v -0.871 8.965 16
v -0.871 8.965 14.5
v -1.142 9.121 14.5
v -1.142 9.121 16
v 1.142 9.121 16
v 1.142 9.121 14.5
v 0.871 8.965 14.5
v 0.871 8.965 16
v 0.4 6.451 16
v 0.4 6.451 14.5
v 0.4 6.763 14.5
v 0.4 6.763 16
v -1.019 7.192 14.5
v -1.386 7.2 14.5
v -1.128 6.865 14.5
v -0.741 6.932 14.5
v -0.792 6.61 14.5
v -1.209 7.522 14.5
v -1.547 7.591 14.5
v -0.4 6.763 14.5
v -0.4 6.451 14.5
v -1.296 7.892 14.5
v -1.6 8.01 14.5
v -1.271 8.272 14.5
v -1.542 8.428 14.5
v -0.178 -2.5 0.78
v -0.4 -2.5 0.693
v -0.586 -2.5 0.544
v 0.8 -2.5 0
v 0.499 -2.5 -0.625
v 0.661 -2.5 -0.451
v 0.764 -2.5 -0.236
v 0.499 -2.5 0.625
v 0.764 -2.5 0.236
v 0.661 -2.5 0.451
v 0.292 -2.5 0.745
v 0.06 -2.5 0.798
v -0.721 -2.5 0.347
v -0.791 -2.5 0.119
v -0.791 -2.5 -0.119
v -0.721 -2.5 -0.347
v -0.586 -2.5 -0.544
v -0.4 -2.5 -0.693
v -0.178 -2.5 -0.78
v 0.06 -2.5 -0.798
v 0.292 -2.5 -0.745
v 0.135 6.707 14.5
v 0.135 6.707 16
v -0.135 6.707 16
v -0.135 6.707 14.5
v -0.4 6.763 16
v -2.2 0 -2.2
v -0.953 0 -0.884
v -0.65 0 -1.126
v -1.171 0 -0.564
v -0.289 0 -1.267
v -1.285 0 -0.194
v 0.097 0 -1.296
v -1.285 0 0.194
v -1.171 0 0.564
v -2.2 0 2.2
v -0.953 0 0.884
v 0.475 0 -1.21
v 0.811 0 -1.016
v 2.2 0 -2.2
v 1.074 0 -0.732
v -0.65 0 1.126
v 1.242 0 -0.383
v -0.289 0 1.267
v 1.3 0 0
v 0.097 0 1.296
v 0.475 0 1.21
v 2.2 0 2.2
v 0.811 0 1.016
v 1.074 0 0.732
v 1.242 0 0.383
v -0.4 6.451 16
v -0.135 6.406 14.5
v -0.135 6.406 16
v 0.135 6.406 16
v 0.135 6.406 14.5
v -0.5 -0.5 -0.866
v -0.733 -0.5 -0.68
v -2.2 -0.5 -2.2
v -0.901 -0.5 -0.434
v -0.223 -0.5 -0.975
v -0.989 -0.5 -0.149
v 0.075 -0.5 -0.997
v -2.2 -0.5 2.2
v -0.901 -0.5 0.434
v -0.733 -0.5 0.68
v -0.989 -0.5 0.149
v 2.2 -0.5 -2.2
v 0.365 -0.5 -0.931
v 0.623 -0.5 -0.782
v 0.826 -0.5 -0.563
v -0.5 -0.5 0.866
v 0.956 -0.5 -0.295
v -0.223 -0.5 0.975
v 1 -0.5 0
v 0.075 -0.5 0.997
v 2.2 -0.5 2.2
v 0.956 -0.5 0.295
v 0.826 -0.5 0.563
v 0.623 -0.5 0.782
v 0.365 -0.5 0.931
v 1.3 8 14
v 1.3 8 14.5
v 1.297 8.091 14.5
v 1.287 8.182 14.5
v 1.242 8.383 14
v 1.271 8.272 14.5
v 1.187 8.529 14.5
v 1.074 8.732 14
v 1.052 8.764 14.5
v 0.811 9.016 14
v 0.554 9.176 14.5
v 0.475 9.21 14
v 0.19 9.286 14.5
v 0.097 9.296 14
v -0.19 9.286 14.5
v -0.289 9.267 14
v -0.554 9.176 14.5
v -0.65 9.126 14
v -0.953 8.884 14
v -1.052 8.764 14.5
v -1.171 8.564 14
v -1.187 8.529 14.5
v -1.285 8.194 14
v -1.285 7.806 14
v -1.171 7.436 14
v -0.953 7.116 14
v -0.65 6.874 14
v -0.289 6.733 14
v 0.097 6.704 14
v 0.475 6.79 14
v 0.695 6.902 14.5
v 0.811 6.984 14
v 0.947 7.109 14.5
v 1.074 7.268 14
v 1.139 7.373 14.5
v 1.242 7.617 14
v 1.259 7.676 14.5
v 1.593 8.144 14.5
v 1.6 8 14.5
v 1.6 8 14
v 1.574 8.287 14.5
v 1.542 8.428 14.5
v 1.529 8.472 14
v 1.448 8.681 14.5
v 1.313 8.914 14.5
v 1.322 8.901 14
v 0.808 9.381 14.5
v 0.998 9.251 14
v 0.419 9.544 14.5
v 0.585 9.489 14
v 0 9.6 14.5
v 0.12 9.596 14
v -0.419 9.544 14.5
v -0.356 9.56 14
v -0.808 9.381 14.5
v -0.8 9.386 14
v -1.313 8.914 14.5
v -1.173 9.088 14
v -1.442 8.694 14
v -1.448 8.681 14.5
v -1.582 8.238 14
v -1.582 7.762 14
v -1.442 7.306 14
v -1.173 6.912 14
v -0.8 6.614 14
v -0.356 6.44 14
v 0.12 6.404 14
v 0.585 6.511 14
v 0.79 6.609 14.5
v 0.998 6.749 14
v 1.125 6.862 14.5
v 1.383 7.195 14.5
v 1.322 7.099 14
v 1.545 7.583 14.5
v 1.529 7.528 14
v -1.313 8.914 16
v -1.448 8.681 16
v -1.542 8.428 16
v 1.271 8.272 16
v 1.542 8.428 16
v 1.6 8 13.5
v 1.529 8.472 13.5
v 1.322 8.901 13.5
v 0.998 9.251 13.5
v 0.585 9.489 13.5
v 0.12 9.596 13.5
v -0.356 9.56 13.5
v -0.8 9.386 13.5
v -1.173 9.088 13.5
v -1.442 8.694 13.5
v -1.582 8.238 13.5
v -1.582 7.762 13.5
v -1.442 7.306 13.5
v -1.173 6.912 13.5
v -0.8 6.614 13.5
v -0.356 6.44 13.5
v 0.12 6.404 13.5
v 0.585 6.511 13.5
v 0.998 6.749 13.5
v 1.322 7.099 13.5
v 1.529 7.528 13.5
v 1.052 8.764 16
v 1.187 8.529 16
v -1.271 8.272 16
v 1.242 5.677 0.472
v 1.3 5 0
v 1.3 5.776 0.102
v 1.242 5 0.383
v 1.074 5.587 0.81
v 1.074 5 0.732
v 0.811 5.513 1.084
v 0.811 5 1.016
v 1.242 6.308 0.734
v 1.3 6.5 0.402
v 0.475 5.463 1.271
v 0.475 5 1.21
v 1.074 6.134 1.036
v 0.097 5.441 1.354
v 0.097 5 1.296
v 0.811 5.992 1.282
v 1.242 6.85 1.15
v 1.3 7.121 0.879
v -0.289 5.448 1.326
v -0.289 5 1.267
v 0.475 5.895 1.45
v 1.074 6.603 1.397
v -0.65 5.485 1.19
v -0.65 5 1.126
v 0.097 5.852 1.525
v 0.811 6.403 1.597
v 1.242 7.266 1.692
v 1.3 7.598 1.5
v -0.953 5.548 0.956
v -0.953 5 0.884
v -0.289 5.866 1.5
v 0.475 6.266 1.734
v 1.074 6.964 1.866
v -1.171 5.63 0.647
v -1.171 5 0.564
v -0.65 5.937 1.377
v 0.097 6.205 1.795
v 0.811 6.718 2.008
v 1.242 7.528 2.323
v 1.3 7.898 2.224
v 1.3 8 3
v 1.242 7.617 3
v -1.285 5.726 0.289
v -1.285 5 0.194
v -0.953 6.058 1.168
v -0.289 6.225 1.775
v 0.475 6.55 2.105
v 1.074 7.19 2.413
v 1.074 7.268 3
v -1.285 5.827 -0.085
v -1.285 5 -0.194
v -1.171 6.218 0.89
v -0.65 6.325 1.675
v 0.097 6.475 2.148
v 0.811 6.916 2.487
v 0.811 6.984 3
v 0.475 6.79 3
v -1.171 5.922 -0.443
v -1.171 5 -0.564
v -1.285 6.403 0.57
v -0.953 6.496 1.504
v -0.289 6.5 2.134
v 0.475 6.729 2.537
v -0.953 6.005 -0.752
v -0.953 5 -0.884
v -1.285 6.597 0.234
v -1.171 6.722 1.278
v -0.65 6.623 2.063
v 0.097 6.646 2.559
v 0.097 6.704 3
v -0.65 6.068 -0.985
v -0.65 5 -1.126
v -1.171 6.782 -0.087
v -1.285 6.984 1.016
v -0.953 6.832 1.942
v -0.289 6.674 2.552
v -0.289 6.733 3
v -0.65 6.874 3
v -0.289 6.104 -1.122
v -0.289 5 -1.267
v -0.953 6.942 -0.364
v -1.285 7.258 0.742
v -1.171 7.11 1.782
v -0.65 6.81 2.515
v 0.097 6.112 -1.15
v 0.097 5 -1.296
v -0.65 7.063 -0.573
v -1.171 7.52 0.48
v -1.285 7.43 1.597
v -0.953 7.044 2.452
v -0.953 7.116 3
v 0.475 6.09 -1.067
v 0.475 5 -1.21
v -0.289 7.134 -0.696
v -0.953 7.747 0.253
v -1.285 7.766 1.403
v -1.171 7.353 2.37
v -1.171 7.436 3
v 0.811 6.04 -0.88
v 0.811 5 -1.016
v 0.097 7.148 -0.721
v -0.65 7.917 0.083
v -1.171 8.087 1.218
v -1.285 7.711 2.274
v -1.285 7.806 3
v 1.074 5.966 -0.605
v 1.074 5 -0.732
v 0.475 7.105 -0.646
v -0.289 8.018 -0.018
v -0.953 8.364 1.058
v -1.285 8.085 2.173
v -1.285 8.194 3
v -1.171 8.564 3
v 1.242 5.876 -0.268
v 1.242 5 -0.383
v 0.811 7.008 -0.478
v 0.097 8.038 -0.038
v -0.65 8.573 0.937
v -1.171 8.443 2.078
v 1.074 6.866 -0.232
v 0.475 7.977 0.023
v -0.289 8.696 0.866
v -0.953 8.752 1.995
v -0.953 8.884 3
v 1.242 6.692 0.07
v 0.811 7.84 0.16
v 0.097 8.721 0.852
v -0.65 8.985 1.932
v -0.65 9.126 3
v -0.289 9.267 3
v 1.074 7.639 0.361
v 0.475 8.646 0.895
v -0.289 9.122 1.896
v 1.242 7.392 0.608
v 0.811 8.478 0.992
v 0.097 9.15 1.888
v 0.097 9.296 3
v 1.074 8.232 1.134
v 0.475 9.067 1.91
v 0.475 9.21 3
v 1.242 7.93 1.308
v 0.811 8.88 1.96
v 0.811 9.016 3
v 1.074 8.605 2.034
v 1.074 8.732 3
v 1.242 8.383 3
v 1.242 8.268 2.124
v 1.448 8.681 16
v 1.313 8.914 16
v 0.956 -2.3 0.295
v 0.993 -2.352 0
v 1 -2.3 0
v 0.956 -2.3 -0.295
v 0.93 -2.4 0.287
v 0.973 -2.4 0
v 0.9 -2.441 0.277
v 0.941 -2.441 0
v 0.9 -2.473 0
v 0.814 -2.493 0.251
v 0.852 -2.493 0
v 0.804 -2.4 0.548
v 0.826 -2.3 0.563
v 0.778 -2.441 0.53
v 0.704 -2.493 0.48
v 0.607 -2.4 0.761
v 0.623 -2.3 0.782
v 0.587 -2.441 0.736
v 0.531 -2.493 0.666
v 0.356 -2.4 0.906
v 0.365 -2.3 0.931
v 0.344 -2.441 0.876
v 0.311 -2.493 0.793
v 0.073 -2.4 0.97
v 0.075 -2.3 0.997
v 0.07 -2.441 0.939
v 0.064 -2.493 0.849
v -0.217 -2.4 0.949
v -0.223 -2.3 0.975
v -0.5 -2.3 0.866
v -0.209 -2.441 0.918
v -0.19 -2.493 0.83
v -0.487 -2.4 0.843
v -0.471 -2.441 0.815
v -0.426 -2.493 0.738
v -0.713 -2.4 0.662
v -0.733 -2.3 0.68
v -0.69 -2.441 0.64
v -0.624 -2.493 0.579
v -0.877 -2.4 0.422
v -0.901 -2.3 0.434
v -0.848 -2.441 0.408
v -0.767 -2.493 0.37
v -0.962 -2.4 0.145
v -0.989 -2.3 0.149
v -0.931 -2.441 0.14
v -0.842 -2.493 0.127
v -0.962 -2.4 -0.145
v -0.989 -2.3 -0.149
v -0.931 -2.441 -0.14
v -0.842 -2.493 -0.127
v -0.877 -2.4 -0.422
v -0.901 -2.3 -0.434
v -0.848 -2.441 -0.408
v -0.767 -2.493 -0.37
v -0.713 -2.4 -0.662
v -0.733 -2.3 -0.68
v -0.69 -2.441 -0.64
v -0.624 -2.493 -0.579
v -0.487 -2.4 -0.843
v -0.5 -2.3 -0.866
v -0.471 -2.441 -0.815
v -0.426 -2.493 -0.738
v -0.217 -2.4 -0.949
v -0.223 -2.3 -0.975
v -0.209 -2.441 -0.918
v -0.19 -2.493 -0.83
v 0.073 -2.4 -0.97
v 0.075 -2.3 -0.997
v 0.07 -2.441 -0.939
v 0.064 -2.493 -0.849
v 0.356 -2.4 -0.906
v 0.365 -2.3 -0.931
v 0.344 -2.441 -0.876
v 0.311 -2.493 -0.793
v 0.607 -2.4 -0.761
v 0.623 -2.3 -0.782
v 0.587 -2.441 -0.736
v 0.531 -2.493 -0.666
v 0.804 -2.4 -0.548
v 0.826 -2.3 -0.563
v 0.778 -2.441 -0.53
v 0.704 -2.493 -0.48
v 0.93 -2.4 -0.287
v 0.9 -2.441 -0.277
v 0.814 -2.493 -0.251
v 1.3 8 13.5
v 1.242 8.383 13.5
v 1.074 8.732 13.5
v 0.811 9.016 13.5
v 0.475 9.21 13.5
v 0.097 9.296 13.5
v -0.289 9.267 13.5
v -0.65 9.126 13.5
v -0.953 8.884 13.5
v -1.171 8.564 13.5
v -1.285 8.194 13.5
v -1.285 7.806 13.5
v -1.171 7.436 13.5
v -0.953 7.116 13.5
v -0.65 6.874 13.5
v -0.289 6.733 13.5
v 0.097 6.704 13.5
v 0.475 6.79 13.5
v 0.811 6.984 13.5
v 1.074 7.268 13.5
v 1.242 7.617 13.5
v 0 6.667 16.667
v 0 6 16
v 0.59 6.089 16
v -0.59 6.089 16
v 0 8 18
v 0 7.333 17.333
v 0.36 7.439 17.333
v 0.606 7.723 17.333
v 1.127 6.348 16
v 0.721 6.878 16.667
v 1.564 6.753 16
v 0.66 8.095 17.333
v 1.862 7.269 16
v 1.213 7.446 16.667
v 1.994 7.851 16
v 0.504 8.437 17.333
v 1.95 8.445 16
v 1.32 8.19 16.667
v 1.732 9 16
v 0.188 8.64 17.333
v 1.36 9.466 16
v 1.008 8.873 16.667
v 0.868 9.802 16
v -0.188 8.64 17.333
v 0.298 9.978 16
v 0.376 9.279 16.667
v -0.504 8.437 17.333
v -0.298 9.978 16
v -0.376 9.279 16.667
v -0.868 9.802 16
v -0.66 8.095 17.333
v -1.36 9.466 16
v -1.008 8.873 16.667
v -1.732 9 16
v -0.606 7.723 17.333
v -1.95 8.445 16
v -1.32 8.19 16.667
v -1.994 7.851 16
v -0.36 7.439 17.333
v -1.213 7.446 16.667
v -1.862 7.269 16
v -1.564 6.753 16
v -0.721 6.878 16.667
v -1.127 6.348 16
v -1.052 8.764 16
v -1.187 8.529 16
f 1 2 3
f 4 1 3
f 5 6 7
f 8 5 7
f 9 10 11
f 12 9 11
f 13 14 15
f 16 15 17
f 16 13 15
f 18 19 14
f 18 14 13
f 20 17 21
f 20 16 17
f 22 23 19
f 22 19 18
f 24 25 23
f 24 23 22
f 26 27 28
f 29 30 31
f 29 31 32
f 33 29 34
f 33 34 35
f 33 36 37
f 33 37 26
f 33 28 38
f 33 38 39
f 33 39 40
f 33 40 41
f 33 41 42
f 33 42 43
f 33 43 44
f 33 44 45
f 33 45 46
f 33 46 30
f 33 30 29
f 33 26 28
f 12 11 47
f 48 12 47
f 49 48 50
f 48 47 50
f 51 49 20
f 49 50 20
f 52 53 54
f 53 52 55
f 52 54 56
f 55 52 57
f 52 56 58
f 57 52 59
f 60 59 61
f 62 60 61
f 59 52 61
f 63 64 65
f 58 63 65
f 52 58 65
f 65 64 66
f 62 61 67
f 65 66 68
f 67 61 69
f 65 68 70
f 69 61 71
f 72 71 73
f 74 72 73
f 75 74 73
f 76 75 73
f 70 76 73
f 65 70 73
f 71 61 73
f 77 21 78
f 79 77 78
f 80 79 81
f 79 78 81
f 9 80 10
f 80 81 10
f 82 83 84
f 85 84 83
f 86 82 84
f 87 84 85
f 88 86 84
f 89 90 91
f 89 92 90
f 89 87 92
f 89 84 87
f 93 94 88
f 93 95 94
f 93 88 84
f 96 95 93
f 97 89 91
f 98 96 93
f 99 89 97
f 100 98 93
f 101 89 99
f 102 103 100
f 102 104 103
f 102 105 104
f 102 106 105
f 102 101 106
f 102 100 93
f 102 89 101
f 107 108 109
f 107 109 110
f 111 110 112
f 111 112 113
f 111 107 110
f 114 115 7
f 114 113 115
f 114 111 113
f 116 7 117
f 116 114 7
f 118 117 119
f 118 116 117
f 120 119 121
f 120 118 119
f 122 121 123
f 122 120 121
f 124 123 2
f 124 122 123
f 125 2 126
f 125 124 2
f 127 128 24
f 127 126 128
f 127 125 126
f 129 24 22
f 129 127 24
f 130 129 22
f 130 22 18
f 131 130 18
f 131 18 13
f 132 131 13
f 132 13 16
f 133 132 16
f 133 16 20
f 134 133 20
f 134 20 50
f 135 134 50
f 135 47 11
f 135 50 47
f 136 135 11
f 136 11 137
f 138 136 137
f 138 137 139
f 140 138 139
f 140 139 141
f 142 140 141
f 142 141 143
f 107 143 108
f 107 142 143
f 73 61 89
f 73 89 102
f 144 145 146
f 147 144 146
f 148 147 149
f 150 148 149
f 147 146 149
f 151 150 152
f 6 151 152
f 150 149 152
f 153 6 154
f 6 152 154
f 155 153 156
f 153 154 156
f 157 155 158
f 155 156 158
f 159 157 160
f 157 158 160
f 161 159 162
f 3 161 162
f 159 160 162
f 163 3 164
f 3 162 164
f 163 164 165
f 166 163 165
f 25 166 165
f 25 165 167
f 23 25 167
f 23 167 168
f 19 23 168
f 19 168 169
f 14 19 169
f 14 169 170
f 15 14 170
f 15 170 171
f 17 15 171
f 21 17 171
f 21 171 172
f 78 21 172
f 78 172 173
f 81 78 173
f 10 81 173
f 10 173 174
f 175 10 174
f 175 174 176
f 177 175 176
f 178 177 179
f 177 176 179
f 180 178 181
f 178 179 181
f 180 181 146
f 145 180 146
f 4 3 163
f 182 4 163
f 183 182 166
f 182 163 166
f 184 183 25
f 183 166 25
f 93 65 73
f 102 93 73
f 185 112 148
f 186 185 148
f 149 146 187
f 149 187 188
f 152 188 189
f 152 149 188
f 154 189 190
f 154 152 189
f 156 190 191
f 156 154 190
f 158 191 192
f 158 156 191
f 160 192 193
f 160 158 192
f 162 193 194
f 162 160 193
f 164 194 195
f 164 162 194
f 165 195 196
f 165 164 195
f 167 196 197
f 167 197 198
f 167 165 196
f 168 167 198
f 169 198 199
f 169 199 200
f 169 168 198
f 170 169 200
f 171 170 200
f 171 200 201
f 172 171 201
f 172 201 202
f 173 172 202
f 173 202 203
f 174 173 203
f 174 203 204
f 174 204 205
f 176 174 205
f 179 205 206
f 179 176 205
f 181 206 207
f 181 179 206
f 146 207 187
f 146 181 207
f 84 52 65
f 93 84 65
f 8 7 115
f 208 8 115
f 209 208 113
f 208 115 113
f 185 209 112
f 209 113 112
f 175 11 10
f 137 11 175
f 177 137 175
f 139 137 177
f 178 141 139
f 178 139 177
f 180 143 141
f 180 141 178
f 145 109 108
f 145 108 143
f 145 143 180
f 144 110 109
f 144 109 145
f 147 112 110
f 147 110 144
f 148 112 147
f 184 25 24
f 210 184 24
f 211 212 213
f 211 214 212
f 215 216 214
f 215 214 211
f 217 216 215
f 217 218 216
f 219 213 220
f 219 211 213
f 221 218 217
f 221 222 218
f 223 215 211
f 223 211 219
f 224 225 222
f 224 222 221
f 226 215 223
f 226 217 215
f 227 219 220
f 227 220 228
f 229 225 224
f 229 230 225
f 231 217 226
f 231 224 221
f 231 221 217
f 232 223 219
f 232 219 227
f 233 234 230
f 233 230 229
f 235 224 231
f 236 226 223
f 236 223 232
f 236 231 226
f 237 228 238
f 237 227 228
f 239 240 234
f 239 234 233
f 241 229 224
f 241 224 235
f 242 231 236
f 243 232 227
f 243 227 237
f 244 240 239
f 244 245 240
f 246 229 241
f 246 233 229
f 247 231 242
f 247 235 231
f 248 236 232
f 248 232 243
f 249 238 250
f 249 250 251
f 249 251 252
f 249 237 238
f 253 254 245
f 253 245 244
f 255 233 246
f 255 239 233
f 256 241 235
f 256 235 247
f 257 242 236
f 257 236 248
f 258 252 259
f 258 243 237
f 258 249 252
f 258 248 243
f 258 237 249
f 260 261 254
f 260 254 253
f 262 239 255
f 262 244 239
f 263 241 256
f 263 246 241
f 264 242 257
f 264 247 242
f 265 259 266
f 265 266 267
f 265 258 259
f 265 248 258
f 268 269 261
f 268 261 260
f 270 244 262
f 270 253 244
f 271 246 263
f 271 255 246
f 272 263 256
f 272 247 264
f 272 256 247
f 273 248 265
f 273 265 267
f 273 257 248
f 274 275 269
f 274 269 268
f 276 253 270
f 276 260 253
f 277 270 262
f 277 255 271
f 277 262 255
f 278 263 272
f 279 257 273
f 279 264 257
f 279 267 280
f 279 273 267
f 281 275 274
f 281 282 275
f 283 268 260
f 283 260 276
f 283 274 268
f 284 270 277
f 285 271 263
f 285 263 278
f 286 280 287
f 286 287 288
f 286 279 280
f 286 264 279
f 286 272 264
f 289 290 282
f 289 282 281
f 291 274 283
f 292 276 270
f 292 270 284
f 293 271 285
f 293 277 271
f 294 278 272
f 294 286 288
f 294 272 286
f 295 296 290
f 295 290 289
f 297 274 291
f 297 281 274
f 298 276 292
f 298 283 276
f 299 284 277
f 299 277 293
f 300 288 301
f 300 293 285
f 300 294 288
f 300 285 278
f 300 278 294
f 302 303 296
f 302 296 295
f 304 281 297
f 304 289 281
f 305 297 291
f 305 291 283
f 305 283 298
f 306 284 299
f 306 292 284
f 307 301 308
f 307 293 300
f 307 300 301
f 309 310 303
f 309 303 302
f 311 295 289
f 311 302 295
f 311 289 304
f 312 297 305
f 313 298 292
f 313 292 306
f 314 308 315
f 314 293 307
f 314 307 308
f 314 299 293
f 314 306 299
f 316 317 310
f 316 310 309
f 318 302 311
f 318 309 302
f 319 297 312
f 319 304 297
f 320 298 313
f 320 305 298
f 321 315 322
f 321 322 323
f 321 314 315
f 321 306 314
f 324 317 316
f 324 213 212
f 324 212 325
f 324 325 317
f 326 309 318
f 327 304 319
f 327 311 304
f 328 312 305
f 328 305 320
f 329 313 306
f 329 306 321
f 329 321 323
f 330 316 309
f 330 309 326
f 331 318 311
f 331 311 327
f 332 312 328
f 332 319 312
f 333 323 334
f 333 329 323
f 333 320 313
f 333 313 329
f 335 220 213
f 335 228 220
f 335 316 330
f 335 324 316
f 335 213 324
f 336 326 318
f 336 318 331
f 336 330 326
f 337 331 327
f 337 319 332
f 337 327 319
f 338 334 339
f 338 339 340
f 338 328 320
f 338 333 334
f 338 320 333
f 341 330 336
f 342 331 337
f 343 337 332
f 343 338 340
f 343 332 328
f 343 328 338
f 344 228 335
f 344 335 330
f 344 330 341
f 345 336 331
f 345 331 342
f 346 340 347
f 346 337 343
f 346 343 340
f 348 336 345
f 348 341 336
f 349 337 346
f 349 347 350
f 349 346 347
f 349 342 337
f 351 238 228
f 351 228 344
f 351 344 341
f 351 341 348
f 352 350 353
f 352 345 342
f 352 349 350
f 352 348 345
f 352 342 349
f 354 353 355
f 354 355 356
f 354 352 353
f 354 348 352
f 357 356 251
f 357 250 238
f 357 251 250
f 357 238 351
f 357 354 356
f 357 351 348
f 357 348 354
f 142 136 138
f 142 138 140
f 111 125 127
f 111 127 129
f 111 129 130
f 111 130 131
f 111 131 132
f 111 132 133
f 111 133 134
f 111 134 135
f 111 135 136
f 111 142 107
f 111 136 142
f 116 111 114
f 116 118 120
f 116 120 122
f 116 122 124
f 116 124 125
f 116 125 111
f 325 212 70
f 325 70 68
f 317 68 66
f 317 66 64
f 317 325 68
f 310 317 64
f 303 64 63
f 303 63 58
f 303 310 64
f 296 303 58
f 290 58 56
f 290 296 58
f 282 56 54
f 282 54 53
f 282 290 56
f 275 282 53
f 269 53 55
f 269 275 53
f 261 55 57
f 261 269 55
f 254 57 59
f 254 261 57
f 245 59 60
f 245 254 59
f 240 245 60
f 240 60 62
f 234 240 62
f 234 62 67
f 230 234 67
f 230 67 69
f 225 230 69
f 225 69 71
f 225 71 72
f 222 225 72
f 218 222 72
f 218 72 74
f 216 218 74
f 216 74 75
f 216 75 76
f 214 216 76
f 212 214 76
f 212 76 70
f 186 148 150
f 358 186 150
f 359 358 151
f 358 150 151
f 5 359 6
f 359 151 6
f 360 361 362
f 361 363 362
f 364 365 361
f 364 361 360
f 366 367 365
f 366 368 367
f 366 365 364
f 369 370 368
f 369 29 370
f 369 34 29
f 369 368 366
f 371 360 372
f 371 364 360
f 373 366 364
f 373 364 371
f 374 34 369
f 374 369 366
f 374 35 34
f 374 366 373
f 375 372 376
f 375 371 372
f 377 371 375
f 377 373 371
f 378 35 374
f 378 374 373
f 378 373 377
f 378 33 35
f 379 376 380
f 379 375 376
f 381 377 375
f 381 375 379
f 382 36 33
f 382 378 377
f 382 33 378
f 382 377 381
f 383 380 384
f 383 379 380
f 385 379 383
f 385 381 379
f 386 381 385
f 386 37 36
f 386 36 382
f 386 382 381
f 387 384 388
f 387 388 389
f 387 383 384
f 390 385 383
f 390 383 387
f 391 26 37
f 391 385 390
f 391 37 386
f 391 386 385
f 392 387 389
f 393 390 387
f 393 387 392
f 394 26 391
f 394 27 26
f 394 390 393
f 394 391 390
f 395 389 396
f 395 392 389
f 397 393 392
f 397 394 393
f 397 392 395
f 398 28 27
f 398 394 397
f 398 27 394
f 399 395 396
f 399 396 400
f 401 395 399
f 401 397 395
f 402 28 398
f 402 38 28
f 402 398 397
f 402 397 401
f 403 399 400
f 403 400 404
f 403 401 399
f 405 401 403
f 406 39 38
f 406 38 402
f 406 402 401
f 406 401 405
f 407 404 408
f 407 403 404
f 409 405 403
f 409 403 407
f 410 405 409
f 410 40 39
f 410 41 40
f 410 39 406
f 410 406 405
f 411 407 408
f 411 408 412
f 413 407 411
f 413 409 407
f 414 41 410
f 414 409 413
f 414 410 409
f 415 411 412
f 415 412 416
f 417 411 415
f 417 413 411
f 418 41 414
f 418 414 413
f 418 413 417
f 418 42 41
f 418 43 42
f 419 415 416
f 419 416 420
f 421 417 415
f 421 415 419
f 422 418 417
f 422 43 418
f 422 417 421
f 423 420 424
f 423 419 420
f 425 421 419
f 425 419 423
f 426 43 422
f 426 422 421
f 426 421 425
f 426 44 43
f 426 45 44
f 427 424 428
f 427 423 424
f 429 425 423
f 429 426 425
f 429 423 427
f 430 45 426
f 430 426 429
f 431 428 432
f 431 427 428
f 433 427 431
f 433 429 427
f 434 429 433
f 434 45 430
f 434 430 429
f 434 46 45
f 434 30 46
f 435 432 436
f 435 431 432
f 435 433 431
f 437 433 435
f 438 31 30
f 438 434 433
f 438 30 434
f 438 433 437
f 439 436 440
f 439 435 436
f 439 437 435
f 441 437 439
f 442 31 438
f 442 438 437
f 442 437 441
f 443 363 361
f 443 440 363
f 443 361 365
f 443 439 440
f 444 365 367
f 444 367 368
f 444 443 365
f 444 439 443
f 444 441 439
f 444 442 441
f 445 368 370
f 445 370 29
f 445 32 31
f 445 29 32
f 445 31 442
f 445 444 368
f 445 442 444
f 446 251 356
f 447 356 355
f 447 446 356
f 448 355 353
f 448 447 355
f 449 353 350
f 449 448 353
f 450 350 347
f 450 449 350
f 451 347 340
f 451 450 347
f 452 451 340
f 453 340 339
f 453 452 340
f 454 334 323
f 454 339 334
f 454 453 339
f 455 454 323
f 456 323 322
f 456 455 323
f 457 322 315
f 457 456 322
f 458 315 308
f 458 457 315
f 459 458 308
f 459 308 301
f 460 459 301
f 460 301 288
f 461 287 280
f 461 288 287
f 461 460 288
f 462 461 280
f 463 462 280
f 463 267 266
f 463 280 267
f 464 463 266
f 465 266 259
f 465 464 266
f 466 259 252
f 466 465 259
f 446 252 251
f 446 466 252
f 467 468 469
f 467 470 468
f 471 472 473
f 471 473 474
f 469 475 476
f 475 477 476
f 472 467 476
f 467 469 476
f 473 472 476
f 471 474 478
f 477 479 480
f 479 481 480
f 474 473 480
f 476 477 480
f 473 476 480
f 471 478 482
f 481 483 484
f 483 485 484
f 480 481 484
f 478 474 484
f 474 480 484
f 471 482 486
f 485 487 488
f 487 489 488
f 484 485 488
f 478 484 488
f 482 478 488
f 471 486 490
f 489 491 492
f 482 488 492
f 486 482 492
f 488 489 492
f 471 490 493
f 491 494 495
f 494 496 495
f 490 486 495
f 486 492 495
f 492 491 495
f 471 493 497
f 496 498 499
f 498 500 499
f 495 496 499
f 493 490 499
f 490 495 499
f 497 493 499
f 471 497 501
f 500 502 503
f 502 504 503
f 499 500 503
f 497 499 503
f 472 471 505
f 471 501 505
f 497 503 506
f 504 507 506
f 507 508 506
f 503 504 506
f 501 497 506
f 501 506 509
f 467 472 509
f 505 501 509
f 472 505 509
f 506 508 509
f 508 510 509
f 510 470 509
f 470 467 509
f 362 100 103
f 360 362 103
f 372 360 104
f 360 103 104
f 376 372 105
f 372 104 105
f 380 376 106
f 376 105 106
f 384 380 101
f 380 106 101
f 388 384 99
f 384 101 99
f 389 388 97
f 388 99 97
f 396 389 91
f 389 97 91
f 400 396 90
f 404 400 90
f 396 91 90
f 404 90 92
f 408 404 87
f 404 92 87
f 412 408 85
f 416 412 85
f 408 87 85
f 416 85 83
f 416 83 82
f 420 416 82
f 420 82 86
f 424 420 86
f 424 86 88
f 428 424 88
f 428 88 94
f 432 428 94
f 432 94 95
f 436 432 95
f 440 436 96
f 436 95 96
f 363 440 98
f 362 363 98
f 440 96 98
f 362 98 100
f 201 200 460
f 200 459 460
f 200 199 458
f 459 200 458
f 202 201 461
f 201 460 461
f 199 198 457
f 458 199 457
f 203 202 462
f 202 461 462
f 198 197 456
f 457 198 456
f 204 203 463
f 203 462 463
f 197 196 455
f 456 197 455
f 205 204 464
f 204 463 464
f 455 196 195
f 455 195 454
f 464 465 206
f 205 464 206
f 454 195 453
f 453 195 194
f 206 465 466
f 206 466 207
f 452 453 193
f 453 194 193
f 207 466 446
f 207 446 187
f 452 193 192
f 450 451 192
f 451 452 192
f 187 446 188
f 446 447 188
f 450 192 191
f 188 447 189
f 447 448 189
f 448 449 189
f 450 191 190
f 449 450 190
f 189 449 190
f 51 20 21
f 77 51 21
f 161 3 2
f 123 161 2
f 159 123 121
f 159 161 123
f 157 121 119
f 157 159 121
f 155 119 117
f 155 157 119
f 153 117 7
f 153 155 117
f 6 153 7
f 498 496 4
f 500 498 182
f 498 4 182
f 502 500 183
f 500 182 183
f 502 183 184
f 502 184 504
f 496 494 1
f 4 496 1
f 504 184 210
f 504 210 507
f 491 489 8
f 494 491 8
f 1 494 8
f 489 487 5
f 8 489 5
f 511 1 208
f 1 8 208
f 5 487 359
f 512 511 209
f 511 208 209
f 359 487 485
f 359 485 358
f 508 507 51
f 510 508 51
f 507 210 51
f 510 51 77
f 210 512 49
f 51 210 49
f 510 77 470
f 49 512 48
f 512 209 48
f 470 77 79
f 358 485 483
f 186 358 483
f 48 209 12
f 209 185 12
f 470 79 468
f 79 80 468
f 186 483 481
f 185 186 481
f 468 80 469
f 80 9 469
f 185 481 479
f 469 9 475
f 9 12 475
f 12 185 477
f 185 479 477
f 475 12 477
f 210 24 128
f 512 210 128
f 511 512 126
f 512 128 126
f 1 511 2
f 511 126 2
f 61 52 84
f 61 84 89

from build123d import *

# Parameters (mm, degrees)
F1_R             = 1.3
F3_W             = 4.4
F3_H             = 4.4
F3_R             = 1.3
F4_DEPTH         = 0.5
F5_R             = 1
F6_DEPTH         = 2
F7_R             = 0.2
F8_R             = 1.6
F8_R_2           = 1.3
F9_DEPTH         = 0.5
F9_DEPTH_BACK    = 0.5
F11_DEPTH        = 1.5
F11_COPIES_COUNT = 3


# Not quite as in the source:
# - a pattern or mirror of a feature is missing from the dataset's text; its kind, count and spacing are read off the source's solid


with BuildPart() as f2:
    # F2: sweep along a path in F0
    with BuildLine(Plane.YZ) as f2_path:
        Line((0, 0), (5, 0))
        ThreePointArc((5, 0), (7.1213203436, 0.8786796564), (8, 3))
        Line((8, 3), (8, 14))
    # F1 (on Front) → F2 (sweep)
    with BuildSketch(Plane.XZ):
        Circle(F1_R)
    sweep(path=f2_path.line)

    # F3 (on face) → F4 (join)
    with BuildSketch(Plane.XZ):
        Rectangle(F3_W, F3_H)
        Circle(F3_R, mode=Mode.SUBTRACT)
        Circle(F3_R)
    extrude(amount=F4_DEPTH)

    # F5 (on face) → F6 (join)
    with BuildSketch(Plane.XZ.offset(0.5)):
        Circle(F5_R)
    extrude(amount=F6_DEPTH)

    # F7
    f7_edges = [f2.edges().sort_by_distance(p)[0] for p in [
        (-1, -2.5, 0),
    ]]
    fillet(f7_edges, radius=F7_R)

    # F8 (on face) → F9 (join, two sides)
    with BuildSketch(Plane.XY.offset(14)) as f9_sk:
        with Locations((0, 8)):
            Circle(F8_R)
        with Locations((0, 8)):
            Circle(F8_R_2, mode=Mode.SUBTRACT)
    extrude(amount=-F9_DEPTH)
    extrude(f9_sk.sketch, amount=F9_DEPTH_BACK)

    # F10 (on face) → F11 (join)
    with BuildSketch(Plane.XY.offset(14.5)):
        with BuildLine():
            Line((-0.4, 6.7630683123), (-0.4, 6.4508066615))
            ThreePointArc((-0.4, 6.4508066615), (0, 6.4), (0.4, 6.4508066615))
            Line((0.4, 6.4508066615), (0.4, 6.7630683123))
            ThreePointArc((0.4, 6.7630683123), (0, 6.7), (-0.4, 6.7630683123))
        make_face()
    f11 = extrude(amount=F11_DEPTH)

    # F11_copies: F11 ×3 about axis
    f11_copies_axis = Axis((0, 8, 0), (0, 0, 1))
    for i in range(1, F11_COPIES_COUNT):
        add(f11.rotate(f11_copies_axis, i * 360 / F11_COPIES_COUNT))

    # F13 (on Right) → F14 (revolve)
    with BuildSketch(Plane.YZ):
        Polygon((6, 16), (6.4508066615, 16), (6.7630683123, 16), (8, 16), (8, 18), align=None)
    revolve(axis=Axis((0, 8, 17.9220158607), (0, 0, 1)))


solid = f2.part
